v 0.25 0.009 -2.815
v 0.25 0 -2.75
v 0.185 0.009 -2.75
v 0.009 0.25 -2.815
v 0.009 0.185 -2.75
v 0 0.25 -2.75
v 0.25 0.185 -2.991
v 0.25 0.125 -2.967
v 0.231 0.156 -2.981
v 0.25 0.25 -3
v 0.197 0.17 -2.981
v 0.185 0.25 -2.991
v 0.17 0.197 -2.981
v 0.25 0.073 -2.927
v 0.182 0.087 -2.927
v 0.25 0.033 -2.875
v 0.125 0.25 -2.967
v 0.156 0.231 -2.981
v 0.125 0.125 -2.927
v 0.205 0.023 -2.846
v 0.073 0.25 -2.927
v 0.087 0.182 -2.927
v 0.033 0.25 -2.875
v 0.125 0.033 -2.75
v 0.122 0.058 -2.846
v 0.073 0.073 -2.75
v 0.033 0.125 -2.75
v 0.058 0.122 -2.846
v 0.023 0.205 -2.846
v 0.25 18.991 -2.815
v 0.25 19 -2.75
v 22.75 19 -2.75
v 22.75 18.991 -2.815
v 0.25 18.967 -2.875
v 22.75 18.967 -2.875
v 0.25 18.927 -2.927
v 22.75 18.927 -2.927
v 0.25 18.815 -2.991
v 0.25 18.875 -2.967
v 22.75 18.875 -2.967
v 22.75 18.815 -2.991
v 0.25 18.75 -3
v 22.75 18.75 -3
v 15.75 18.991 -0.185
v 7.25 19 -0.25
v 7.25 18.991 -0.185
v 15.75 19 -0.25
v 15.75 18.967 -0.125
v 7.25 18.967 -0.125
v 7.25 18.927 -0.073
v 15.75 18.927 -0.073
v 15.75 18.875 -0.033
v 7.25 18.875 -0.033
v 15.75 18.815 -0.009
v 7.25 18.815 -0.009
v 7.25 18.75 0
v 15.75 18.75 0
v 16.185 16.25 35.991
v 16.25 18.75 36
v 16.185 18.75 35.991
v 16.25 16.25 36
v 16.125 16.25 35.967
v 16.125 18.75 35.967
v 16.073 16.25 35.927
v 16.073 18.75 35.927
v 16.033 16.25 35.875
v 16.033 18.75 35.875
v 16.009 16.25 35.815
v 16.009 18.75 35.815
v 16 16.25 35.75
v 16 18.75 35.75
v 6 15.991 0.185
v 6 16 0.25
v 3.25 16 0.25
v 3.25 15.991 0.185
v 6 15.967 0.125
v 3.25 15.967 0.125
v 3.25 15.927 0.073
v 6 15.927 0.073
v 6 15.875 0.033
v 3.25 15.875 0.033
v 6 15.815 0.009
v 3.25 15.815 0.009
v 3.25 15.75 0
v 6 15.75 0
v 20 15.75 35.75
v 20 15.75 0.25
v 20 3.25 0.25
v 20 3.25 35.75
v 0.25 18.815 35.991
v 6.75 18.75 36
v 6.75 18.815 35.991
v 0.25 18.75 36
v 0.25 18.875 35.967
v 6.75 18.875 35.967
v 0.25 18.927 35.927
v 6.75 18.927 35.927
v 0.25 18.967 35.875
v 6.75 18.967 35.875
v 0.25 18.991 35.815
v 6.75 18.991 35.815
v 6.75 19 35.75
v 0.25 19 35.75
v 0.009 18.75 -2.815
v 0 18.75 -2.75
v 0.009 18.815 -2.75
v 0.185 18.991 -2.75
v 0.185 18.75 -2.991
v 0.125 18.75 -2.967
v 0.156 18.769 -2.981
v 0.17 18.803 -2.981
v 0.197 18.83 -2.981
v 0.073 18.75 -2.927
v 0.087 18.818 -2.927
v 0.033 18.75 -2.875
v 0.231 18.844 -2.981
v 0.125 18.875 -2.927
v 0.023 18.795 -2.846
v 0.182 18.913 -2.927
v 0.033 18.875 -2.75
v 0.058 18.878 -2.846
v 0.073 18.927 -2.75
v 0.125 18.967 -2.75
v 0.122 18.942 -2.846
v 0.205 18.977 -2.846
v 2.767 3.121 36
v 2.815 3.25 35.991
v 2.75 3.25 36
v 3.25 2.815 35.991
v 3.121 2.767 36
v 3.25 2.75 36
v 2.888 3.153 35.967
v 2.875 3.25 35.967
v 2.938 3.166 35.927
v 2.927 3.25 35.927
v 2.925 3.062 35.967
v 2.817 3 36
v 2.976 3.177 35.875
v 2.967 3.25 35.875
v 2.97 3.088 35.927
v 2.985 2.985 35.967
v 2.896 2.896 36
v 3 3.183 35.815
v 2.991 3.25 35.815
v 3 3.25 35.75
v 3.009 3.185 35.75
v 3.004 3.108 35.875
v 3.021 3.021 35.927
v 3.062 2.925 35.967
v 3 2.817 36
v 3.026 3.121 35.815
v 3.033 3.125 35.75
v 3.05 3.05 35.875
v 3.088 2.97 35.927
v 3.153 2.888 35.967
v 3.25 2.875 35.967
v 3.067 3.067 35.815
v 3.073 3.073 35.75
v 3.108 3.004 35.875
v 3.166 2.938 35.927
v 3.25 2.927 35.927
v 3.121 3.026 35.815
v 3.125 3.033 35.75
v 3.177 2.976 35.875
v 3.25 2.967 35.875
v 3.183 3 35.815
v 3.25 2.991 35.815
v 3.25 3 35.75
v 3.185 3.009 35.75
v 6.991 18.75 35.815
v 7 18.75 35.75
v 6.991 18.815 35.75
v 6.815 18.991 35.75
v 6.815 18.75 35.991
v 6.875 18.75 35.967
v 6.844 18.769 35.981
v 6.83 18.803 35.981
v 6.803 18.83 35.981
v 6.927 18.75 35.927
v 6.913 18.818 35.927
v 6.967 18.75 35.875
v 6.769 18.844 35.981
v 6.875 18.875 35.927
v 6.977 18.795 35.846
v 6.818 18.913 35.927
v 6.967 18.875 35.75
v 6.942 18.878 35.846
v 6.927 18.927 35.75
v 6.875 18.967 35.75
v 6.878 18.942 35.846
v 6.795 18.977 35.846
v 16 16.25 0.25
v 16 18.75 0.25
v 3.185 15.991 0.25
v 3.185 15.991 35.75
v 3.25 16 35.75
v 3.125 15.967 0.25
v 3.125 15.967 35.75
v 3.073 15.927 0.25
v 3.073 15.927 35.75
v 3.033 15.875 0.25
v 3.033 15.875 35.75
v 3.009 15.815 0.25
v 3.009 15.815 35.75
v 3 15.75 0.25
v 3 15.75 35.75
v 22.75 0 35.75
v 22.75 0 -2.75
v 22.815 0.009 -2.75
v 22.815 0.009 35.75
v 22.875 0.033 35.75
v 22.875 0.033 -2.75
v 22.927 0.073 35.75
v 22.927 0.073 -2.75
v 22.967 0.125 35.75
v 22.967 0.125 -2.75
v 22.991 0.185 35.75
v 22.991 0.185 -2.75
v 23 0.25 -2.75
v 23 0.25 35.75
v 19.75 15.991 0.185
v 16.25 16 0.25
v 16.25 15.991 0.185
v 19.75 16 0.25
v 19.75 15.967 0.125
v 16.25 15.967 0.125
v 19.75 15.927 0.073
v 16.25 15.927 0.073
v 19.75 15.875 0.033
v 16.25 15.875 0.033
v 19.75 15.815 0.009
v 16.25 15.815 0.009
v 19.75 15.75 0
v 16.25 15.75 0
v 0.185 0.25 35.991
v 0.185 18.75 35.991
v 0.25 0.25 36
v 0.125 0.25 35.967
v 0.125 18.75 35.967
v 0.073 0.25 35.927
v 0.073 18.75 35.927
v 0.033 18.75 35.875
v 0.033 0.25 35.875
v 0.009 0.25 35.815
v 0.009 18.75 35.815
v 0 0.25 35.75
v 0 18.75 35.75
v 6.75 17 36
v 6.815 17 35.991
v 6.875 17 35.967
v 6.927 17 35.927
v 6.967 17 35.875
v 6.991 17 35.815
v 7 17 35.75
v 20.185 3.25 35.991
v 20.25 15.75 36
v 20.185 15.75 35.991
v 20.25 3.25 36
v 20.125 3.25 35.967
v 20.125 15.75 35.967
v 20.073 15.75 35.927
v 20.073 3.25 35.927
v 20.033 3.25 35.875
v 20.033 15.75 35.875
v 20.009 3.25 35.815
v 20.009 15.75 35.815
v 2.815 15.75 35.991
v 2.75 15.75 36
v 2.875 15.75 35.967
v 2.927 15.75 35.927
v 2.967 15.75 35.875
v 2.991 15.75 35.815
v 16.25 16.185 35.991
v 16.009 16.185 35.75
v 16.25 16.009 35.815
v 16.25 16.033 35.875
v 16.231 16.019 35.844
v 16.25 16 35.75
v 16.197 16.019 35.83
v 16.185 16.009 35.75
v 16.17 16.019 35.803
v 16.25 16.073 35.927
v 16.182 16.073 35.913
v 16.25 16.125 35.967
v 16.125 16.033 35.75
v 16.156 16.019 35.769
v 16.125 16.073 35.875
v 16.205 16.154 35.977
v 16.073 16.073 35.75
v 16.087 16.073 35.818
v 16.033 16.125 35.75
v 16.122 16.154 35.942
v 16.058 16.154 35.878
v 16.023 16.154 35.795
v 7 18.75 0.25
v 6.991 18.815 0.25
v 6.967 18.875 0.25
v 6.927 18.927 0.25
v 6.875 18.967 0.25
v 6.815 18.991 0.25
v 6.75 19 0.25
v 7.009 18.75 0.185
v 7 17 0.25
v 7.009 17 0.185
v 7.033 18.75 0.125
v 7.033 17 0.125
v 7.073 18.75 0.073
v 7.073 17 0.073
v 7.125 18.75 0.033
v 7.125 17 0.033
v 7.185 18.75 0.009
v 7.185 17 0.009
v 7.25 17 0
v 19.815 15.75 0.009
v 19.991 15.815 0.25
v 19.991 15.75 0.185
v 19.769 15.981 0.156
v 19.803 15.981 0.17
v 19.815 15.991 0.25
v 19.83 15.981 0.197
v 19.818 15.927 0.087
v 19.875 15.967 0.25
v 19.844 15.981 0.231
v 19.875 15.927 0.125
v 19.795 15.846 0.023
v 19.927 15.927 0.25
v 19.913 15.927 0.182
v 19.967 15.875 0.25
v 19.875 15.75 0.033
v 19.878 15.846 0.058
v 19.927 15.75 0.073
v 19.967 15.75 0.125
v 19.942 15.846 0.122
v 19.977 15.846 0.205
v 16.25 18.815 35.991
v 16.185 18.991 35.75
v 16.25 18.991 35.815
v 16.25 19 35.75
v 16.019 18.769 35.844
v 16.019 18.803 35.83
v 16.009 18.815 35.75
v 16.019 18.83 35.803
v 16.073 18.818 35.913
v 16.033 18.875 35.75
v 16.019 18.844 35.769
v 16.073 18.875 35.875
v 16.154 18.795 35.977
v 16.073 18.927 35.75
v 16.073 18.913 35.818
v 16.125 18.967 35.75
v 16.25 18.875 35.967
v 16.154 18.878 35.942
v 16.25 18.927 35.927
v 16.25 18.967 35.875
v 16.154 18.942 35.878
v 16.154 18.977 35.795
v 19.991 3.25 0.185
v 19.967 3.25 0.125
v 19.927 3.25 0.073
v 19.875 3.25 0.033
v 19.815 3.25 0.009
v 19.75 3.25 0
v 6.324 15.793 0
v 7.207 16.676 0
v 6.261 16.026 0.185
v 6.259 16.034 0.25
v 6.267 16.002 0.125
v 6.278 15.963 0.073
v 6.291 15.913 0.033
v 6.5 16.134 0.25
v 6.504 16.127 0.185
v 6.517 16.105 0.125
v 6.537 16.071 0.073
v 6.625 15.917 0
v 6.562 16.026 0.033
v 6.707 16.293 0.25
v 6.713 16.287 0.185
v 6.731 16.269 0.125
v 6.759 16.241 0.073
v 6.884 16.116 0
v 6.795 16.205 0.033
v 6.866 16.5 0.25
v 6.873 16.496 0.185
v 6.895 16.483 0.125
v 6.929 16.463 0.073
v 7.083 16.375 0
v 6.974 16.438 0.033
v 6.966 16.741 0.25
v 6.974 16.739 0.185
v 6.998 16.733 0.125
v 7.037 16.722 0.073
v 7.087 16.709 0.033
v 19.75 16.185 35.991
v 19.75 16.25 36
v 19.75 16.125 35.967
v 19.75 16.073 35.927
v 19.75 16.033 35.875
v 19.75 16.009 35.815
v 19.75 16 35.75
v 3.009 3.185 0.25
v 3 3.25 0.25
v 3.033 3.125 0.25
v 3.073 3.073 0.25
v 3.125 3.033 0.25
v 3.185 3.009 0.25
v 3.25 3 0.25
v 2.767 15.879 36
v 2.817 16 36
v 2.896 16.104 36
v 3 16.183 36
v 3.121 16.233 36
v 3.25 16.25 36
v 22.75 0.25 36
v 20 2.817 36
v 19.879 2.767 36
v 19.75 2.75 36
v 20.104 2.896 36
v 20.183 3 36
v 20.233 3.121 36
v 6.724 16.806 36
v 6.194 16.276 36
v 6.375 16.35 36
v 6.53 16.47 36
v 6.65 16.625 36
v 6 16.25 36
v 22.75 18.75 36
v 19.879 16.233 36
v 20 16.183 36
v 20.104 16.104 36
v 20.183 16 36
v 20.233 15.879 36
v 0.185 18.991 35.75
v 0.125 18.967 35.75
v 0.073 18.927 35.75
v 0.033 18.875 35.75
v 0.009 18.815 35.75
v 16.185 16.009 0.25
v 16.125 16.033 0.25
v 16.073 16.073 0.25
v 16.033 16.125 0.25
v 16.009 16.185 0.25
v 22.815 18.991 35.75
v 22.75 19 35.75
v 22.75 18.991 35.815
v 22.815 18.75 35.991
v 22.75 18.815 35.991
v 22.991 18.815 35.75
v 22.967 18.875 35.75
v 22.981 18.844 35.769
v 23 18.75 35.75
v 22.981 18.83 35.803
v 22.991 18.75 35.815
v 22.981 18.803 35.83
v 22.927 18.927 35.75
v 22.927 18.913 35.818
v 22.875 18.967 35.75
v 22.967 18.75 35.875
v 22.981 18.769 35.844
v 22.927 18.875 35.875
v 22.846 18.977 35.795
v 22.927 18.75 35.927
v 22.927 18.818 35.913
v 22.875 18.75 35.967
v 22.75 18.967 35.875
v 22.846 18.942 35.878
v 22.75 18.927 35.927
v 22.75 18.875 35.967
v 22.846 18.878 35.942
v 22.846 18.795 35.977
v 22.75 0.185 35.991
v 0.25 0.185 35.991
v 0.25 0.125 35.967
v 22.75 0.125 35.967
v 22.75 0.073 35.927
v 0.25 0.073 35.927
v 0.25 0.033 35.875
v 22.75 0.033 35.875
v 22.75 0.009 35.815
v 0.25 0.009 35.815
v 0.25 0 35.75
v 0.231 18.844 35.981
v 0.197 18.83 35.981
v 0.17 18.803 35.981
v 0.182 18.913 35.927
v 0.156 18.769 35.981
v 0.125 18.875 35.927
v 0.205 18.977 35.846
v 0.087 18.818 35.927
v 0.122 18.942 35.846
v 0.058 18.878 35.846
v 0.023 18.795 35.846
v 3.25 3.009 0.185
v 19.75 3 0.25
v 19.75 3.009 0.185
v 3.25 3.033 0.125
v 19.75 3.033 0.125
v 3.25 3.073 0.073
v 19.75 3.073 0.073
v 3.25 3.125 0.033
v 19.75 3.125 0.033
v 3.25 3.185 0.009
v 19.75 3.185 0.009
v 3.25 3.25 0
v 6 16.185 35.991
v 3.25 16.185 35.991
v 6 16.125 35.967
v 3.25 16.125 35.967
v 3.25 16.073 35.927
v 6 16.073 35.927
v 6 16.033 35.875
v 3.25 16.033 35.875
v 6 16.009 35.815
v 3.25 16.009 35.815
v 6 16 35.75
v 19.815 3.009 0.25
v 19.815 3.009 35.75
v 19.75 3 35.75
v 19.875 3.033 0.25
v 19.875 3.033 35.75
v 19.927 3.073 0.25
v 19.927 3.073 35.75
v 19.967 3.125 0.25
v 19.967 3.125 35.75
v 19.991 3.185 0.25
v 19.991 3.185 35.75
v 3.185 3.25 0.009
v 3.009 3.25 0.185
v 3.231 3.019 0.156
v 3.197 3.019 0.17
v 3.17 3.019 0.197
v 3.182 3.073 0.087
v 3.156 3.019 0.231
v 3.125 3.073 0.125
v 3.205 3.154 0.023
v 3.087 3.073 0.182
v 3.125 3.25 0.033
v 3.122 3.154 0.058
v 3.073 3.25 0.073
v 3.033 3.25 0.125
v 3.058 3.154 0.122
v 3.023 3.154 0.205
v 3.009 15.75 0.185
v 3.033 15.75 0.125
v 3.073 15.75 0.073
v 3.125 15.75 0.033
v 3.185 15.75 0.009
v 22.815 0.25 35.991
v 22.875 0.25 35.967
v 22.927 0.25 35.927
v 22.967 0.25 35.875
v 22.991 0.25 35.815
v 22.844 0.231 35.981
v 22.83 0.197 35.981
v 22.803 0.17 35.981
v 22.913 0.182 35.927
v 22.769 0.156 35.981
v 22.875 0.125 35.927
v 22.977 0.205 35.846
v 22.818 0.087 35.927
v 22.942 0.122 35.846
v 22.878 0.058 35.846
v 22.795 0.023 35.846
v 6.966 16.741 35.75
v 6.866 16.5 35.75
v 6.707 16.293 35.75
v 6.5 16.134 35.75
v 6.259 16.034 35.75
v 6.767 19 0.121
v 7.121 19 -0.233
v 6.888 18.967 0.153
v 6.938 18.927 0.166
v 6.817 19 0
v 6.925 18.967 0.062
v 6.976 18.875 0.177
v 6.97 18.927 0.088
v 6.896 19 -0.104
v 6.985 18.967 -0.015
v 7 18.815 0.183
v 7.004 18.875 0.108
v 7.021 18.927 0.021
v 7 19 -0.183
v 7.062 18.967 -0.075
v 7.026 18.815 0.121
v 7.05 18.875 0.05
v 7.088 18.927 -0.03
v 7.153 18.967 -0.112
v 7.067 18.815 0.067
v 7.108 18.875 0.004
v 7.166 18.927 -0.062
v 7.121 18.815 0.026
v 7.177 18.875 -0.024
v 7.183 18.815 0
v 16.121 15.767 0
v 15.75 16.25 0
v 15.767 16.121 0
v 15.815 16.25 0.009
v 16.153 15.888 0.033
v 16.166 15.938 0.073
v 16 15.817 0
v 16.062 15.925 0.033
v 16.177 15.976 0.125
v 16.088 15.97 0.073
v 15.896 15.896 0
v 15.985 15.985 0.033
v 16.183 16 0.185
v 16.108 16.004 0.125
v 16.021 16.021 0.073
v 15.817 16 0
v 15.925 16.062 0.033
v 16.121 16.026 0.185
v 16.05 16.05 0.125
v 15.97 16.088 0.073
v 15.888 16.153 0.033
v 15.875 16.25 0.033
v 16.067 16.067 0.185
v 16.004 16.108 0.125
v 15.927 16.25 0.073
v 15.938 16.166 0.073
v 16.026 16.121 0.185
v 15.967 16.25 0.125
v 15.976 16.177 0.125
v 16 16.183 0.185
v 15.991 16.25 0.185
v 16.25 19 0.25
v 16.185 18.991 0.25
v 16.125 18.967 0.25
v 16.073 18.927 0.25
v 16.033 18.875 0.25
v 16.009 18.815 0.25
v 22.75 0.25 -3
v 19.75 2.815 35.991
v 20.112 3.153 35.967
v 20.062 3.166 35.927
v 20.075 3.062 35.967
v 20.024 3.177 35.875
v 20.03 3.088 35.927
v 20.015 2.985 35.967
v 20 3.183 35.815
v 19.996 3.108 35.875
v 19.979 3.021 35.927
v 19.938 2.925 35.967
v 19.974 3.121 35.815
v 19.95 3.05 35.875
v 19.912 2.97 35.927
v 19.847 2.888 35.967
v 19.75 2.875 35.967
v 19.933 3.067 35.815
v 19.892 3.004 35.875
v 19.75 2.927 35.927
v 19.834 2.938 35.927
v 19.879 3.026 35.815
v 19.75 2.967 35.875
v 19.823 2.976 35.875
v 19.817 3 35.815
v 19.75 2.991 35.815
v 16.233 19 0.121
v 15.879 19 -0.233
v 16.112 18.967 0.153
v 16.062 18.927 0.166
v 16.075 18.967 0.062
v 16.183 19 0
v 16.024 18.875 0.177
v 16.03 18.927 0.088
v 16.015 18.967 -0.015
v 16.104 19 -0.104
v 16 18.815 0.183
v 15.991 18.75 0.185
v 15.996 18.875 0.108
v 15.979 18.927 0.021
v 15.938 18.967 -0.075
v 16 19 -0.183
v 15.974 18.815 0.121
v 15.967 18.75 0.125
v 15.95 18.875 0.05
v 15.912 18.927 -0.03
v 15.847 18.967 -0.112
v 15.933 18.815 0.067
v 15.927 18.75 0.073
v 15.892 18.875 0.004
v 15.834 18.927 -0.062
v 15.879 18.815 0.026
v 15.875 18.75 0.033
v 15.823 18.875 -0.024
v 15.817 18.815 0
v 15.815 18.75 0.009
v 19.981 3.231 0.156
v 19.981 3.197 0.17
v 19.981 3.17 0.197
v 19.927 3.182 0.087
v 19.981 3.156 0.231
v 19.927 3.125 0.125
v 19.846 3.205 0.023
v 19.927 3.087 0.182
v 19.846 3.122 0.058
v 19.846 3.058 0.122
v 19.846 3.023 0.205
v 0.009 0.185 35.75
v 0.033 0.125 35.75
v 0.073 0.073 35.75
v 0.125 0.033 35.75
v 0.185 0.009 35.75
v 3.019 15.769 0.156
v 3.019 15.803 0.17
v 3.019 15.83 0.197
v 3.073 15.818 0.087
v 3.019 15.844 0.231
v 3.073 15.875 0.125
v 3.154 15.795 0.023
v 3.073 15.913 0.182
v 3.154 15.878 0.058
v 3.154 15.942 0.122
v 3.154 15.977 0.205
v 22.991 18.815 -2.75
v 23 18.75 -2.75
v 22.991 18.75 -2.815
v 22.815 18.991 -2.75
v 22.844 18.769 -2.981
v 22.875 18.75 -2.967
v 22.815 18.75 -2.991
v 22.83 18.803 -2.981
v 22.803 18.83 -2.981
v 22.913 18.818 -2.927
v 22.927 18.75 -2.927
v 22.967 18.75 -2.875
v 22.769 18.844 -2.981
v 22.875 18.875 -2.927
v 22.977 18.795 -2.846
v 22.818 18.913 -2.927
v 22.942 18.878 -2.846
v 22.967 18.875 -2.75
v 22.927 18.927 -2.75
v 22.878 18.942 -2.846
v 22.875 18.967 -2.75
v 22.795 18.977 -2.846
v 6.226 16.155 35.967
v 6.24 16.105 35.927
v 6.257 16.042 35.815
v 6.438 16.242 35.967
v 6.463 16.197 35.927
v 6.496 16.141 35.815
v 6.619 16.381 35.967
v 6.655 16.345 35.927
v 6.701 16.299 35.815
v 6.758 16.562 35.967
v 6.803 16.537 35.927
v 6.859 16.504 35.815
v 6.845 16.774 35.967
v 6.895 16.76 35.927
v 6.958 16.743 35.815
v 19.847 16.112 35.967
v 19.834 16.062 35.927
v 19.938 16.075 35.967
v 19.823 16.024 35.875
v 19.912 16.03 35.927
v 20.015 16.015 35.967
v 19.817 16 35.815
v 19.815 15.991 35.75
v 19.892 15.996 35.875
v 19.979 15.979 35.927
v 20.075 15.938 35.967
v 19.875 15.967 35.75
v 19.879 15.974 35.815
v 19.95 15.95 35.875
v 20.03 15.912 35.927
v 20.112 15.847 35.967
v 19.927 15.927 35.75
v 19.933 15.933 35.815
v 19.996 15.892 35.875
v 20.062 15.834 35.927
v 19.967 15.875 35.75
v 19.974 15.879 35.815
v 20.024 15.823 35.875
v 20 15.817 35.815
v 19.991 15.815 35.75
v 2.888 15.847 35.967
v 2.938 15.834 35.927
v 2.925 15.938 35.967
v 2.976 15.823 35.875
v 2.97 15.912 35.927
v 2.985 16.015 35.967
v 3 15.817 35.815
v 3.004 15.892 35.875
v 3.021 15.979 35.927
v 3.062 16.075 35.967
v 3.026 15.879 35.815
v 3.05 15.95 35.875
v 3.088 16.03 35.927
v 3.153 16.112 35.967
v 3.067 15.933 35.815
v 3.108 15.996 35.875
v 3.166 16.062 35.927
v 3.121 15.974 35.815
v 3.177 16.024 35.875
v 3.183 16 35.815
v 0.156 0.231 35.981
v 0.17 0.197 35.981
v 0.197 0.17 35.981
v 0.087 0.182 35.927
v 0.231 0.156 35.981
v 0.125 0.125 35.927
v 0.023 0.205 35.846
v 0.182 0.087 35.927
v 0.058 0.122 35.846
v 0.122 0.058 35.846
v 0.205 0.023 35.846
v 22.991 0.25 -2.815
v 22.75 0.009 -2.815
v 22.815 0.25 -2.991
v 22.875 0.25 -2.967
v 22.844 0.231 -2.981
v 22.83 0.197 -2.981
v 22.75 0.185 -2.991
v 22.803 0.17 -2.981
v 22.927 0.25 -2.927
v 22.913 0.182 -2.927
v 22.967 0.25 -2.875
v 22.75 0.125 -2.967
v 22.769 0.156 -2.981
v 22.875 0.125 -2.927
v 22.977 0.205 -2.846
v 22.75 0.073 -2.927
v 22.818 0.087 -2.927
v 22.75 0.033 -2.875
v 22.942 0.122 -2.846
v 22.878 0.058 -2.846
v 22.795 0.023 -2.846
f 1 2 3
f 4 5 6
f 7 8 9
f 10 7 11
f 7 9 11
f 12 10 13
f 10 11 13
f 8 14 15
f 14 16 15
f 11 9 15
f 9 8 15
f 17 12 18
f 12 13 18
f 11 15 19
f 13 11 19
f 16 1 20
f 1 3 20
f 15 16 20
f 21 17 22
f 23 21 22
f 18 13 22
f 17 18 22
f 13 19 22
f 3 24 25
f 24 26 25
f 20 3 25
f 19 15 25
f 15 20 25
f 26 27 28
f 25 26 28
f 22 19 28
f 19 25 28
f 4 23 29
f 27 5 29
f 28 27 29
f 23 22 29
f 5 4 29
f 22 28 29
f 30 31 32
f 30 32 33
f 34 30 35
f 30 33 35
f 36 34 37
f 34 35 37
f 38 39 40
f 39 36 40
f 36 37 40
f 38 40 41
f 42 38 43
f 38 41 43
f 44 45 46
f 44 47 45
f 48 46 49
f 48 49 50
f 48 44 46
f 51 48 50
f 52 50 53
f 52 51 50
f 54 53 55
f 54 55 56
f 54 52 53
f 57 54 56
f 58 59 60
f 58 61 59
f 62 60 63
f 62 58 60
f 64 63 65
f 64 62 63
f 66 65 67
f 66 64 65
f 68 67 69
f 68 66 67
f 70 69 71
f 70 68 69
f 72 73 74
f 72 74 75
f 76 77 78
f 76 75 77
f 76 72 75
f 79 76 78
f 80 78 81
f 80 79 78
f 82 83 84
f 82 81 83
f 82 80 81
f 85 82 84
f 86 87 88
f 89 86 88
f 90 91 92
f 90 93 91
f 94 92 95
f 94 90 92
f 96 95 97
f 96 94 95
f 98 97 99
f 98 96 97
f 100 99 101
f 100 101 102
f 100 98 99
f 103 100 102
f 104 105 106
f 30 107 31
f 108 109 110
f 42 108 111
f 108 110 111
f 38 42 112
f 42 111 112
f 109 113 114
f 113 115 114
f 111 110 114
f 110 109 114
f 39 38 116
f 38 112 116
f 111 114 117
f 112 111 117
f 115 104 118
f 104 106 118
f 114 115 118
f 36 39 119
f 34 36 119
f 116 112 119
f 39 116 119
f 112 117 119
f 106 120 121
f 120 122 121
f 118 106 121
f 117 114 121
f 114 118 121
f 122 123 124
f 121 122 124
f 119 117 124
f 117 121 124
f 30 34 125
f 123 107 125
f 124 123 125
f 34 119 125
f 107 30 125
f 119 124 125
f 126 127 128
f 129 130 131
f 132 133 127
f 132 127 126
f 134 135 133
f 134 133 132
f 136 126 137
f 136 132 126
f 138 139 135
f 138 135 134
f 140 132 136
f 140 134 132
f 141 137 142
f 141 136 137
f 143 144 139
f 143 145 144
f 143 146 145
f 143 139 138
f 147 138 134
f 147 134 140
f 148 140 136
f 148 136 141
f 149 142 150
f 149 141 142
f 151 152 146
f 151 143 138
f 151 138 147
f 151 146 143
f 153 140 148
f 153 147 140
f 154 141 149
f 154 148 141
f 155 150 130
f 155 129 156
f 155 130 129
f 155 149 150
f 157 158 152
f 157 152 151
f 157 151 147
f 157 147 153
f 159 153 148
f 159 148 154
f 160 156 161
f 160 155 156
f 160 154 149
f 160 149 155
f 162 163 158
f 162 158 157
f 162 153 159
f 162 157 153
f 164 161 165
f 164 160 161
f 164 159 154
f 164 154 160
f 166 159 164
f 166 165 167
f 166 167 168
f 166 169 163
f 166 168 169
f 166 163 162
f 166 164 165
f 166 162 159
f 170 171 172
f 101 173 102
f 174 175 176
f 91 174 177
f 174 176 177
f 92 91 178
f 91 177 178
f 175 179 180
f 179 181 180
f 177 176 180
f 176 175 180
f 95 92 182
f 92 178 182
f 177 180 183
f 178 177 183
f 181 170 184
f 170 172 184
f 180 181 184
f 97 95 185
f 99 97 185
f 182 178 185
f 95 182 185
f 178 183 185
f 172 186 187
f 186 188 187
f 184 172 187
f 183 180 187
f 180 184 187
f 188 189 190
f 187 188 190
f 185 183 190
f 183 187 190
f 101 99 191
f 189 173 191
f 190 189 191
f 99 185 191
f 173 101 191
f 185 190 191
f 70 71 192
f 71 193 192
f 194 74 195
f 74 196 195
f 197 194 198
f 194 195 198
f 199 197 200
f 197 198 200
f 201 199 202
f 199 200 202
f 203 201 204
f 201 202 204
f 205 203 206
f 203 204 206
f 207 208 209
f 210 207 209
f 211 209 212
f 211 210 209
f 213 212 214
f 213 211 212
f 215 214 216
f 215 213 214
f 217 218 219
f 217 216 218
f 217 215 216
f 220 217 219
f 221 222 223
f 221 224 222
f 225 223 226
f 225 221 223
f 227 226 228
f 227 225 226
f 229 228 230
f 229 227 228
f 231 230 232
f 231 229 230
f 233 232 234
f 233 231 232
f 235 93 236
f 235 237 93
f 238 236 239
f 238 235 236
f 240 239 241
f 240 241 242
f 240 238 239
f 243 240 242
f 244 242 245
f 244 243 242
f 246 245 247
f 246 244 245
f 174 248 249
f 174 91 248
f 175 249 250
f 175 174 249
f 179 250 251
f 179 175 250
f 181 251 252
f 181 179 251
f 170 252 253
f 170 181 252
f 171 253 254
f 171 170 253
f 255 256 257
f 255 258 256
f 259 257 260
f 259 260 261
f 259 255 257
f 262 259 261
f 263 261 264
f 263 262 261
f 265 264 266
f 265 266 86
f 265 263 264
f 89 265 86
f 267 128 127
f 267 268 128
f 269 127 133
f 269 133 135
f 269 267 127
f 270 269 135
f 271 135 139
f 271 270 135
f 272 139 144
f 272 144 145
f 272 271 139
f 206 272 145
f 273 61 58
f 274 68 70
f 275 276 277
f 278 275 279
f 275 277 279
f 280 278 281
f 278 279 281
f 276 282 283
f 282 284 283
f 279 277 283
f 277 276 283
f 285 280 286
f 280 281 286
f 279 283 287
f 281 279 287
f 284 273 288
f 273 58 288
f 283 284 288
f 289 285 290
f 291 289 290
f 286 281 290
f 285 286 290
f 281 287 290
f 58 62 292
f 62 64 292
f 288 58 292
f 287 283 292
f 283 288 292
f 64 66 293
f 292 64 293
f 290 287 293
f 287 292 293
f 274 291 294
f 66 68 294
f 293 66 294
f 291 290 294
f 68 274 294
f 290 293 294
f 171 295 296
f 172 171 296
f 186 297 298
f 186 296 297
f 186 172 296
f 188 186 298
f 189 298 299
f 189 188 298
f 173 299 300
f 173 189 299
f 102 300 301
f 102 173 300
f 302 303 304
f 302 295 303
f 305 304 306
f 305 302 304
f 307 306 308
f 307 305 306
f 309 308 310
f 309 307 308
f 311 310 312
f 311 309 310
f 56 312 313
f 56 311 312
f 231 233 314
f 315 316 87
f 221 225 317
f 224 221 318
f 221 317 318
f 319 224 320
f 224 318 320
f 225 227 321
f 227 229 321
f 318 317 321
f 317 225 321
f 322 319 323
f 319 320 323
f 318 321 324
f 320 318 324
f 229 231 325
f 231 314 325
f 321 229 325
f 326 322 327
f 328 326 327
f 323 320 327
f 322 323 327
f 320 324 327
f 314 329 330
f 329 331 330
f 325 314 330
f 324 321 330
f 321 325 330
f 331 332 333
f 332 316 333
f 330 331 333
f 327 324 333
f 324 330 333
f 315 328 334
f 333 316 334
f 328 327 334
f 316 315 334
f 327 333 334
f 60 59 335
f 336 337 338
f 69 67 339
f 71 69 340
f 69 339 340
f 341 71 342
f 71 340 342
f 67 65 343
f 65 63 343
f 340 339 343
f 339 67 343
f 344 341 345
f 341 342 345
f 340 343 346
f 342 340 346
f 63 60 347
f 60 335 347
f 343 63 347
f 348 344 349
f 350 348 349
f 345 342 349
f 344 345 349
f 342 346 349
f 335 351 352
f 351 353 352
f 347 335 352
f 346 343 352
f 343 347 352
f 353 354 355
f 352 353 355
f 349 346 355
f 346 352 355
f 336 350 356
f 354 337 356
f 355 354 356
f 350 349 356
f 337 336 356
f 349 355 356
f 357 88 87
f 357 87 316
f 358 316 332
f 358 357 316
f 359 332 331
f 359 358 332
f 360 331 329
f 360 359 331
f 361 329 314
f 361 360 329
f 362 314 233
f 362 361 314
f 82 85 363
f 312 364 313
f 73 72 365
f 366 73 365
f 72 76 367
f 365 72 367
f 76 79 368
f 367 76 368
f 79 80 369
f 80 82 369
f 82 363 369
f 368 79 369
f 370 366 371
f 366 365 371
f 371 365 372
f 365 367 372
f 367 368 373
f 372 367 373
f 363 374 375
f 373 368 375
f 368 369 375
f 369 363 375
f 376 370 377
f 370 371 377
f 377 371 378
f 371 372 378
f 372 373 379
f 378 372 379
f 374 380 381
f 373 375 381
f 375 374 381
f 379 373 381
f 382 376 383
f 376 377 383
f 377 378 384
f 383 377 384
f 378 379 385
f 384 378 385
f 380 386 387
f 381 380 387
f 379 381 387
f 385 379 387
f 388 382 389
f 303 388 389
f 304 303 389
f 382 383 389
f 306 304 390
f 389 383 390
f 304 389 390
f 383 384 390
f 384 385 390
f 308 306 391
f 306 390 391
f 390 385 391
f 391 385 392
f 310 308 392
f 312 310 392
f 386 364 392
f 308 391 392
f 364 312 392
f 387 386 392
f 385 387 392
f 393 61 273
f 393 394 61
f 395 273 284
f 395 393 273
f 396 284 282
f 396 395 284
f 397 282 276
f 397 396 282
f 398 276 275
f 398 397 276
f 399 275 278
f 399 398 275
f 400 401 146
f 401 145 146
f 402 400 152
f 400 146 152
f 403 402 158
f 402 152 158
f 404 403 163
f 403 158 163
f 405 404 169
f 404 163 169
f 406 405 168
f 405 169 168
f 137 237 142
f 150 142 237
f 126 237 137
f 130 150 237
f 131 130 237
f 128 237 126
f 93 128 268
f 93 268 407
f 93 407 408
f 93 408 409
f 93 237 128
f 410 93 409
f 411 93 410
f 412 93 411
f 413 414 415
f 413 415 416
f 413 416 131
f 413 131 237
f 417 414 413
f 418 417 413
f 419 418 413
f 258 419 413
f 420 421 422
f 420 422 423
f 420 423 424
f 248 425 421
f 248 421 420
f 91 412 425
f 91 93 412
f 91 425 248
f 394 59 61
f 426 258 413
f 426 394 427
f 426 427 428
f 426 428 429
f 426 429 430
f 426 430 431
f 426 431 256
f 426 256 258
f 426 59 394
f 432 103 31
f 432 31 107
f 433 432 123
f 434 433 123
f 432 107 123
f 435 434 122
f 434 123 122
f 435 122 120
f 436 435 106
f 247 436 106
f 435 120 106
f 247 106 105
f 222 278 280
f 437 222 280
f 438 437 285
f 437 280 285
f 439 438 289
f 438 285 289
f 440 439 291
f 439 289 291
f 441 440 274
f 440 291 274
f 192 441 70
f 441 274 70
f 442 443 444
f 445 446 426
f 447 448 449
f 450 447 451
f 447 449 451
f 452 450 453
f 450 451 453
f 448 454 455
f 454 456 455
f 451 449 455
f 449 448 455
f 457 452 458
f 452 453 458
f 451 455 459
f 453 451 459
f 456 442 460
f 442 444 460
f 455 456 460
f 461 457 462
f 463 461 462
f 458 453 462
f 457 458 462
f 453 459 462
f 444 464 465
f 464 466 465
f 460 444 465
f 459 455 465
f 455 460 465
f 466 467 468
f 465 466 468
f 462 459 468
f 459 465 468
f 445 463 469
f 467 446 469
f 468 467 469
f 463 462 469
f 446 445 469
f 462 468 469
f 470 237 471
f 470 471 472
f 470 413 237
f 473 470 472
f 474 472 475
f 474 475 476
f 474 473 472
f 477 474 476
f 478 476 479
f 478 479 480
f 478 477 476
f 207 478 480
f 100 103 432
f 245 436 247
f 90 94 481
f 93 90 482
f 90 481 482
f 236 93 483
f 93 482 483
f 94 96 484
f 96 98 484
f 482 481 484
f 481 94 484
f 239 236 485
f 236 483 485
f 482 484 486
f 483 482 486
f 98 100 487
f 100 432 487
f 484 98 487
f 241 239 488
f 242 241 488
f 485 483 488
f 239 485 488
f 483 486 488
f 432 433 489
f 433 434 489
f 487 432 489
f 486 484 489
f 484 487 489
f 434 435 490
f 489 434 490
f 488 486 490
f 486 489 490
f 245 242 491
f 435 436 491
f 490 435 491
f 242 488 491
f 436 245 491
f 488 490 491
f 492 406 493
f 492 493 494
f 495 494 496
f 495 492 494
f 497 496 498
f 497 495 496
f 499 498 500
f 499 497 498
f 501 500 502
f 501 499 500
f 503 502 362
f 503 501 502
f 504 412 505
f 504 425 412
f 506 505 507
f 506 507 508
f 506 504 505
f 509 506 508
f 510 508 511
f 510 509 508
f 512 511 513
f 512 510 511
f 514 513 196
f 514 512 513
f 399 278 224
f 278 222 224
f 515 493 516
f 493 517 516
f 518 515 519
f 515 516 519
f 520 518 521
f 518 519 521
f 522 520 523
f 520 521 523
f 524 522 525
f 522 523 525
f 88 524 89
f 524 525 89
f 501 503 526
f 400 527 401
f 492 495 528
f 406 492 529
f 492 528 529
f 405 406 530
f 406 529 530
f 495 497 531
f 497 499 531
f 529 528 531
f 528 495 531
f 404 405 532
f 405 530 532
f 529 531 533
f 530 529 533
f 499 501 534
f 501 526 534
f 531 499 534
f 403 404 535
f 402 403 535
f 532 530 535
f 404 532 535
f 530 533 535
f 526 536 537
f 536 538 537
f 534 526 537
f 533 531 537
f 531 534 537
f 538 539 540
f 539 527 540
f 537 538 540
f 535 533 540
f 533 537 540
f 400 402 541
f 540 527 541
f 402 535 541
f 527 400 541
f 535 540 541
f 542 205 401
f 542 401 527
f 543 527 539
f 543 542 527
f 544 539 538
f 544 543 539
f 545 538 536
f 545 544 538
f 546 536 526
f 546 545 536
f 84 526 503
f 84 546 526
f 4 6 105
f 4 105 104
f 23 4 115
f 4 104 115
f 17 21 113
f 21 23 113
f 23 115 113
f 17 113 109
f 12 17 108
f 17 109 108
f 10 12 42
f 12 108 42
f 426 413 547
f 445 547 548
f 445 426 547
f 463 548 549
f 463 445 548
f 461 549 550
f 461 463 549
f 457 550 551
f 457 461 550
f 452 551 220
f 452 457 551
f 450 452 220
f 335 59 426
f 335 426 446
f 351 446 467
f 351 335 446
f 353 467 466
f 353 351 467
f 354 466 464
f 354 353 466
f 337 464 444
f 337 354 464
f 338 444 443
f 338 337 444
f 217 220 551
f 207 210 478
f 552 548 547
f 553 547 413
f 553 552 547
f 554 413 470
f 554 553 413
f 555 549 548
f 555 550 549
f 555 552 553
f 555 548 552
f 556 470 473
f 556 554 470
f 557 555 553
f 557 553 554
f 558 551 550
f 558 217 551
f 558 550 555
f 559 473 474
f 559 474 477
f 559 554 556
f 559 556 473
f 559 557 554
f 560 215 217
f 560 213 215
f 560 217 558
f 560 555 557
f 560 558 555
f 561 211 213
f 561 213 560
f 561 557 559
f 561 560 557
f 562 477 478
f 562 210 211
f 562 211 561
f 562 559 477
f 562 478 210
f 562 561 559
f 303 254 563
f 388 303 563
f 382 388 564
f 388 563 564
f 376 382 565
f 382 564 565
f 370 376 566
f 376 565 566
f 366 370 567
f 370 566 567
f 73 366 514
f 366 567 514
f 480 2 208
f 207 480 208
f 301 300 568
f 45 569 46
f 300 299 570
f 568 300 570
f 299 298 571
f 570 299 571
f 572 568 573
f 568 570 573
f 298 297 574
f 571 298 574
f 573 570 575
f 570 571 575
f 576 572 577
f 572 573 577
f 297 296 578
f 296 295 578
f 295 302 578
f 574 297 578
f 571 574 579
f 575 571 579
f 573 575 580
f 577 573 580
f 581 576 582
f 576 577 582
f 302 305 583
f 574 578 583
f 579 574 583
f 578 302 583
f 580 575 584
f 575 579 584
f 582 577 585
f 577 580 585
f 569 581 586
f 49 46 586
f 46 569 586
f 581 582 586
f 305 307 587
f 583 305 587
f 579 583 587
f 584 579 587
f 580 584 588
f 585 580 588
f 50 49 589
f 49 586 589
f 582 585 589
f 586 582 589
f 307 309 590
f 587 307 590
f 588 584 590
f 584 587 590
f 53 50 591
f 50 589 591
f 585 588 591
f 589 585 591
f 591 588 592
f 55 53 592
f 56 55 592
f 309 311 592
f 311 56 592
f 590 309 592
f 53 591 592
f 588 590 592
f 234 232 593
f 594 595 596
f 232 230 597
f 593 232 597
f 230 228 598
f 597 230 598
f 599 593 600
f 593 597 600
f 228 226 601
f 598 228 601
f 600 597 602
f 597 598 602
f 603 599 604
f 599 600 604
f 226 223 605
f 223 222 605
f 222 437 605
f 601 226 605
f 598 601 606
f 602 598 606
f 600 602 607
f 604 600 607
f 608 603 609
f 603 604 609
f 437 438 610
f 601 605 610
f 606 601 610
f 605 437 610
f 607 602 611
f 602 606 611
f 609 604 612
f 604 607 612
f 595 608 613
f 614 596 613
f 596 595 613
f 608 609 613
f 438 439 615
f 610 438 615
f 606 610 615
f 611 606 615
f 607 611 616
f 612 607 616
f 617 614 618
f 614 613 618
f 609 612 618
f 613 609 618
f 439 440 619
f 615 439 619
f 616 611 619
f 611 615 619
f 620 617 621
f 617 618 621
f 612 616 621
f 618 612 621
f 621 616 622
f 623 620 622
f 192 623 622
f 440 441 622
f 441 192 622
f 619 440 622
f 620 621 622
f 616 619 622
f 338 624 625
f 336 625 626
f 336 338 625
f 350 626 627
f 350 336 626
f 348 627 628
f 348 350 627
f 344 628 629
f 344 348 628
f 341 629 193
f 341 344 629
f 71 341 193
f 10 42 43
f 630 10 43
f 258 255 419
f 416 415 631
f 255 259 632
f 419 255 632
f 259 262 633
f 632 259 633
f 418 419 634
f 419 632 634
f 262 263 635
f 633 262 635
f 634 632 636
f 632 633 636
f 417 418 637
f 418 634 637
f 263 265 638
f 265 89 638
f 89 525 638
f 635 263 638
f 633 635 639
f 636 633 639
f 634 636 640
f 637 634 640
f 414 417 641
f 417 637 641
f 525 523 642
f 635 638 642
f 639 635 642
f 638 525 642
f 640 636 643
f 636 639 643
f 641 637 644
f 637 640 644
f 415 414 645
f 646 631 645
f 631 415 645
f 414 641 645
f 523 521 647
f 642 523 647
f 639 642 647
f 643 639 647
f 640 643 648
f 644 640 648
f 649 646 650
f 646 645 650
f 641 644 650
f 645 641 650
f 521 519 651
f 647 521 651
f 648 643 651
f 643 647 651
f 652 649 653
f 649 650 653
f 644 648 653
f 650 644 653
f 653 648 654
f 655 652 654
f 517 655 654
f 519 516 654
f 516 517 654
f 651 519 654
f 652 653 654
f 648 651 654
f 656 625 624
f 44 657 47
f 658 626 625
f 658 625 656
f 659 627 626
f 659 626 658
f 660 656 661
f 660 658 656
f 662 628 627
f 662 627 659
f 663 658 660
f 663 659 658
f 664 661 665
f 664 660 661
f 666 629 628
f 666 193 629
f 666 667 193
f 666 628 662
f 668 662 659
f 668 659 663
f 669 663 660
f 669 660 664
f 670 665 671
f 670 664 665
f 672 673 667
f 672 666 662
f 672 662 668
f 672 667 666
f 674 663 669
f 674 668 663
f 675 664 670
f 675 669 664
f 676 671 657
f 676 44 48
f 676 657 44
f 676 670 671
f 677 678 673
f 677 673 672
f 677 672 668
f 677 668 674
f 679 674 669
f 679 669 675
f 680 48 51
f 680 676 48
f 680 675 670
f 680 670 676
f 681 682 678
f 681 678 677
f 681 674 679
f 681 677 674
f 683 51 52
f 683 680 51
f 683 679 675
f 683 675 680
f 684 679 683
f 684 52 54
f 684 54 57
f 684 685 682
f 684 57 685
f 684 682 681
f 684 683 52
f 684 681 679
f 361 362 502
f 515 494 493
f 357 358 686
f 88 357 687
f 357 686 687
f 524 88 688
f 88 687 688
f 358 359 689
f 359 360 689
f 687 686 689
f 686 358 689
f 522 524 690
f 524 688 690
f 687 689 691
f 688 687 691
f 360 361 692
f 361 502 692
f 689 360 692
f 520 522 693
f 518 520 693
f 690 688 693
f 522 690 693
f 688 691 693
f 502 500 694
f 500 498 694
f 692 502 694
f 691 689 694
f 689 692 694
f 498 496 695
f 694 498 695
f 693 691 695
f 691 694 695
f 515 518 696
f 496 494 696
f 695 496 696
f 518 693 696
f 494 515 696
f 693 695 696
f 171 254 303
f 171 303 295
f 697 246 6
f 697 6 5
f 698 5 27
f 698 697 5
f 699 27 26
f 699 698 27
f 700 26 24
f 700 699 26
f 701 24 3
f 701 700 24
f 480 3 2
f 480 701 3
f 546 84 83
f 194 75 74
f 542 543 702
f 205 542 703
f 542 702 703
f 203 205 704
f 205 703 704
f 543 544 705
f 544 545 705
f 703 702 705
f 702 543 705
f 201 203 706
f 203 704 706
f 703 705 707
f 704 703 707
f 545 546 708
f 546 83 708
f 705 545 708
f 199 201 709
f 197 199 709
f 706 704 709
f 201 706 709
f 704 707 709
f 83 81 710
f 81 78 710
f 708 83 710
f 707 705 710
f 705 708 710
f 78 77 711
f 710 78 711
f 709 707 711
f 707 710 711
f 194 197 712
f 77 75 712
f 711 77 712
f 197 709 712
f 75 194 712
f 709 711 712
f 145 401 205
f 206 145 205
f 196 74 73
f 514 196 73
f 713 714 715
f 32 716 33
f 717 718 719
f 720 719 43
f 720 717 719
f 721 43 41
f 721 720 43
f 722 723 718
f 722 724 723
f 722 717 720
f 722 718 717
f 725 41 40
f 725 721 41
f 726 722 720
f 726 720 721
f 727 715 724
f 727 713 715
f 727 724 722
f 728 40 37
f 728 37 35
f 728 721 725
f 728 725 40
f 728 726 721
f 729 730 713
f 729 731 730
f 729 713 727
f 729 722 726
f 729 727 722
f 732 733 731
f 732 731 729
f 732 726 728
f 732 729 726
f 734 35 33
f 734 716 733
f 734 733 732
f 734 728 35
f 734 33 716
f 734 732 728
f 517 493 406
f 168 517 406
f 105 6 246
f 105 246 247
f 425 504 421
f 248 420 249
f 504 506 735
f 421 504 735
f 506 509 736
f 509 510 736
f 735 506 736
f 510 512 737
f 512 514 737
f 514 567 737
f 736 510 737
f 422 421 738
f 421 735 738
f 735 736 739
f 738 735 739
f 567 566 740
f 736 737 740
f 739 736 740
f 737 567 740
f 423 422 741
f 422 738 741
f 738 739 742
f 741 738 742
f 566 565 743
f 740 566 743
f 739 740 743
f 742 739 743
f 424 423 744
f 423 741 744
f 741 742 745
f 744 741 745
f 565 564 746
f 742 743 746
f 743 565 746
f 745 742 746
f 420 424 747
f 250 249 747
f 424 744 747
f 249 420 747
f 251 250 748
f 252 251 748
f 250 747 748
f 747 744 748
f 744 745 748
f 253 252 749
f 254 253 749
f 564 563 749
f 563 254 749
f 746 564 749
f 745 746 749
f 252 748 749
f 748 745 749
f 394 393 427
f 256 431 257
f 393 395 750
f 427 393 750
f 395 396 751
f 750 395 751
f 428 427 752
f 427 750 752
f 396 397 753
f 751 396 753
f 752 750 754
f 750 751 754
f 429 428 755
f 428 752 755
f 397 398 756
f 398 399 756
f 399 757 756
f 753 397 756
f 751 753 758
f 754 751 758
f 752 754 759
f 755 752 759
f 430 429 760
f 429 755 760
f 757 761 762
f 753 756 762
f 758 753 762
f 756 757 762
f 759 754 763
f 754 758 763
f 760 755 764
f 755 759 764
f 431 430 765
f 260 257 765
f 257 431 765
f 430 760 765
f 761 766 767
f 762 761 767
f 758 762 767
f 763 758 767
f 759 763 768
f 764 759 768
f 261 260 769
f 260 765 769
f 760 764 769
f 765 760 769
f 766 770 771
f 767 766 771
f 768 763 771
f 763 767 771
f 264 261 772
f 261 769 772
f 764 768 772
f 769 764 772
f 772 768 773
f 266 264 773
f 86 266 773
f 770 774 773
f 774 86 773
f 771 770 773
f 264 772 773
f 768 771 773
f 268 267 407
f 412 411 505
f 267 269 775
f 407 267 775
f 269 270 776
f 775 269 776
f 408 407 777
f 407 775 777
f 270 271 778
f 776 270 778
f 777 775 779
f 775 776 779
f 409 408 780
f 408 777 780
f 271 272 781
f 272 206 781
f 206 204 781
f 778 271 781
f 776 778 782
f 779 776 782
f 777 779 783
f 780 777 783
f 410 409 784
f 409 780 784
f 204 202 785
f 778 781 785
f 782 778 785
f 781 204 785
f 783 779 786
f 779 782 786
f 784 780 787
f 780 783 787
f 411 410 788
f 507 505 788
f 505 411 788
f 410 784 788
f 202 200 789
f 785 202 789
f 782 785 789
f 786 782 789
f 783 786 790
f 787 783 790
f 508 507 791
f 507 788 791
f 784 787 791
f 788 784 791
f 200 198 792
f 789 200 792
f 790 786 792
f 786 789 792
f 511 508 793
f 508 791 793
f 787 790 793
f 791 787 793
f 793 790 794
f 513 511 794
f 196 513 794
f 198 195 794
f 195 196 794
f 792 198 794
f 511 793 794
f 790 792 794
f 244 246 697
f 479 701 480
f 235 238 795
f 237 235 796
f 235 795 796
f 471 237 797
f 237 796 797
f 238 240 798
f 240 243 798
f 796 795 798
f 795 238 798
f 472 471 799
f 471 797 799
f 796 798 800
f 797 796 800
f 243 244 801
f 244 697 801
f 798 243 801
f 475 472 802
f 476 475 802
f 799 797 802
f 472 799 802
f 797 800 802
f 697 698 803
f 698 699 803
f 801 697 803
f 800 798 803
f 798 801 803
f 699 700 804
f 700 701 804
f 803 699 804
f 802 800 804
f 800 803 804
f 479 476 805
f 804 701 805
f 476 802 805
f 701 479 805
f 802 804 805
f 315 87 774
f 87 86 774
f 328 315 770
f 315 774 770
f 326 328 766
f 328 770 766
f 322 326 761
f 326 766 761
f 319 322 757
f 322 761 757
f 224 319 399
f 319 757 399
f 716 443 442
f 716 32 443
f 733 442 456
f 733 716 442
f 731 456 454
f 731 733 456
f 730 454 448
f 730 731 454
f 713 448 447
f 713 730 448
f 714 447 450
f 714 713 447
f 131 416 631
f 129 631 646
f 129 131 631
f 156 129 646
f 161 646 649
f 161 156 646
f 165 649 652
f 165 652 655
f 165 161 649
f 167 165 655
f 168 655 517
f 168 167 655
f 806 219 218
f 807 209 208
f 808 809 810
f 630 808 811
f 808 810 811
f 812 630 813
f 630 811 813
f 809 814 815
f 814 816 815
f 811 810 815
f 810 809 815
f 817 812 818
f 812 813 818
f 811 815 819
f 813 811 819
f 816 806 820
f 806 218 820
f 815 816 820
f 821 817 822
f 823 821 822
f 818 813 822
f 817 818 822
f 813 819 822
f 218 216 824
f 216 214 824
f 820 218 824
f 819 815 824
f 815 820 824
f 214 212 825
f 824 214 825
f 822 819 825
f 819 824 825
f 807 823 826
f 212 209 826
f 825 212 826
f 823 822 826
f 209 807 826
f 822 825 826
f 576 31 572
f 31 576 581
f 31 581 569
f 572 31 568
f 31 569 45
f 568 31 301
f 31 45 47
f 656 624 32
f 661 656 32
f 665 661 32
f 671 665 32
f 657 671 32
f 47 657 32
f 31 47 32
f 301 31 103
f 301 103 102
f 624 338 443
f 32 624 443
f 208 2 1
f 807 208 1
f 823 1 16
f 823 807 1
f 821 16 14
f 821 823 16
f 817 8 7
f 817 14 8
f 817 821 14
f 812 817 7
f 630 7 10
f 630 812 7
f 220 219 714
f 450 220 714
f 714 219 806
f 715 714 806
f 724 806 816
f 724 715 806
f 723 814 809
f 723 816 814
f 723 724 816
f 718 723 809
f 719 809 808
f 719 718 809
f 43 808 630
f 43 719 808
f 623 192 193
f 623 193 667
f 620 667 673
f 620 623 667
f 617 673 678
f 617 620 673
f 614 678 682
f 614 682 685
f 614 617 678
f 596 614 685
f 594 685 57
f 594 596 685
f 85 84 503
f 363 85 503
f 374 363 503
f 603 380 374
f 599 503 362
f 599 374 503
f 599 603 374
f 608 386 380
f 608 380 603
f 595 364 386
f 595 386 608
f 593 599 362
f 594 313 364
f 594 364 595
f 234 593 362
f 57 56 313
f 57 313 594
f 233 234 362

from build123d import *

# Parameters (mm, degrees)
BOSS_EXTRU_1_DEPTH = 36
ESQUISSE2_W        = 23
ESQUISSE2_H        = 19
BOSS_EXTRU_2_DEPTH = 3
CONG_1_R           = 1
CONG_2_R           = 0.25


with BuildPart() as part:
    # Esquisse1 → Boss.-Extru.1 (new body)
    with BuildSketch(Plane.XY):
        Polygon((0, 0), (23, 0), (23, 3), (23, 19), (16, 19), (16, 16), (20, 16), (20, 3), (3, 3), (3, 16), (7, 16), (7, 19), (0, 19), (0, 3), align=None)
    extrude(amount=BOSS_EXTRU_1_DEPTH)

    # Esquisse2 → Boss.-Extru.2 (add)
    with BuildSketch(Plane.XY):
        with Locations((11.5, 9.5)):
            Rectangle(ESQUISSE2_W, ESQUISSE2_H)
    extrude(amount=-BOSS_EXTRU_2_DEPTH)

    # Congé1
    cong_1_edges = [part.edges().sort_by_distance(p)[0] for p in [
        (7, 16, 18),
    ]]
    fillet(cong_1_edges, radius=CONG_1_R)

    # Congé2
    cong_2_edges = [part.edges().sort_by_distance(p)[0] for p in [
        (19.5, 19, 36),
        (16, 17.5, 36),
        (4.5, 16, 0),
        (3, 9.5, 0),
        (11.5, 3, 0),
        (20, 9.5, 0),
        (18, 16, 36),
        (18, 16, 0),
        (16, 17.5, 0),
        (20, 9.5, 36),
        (11.5, 3, 36),
        (23, 0, 16.5),
        (0, 0, 16.5),
        (0, 19, 16.5),
        (7, 19, 18),
        (3, 16, 18),
        (3, 3, 18),
        (20, 3, 18),
        (20, 16, 18),
        (16, 16, 18),
        (16, 19, 18),
        (23, 19, 16.5),
        (3, 9.5, 36),
        (4.5, 16, 36),
        (3.5, 19, 36),
        (0, 9.5, 36),
        (23, 9.5, 36),
        (23, 9.5, -3),
        (11.5, 0, -3),
        (0, 9.5, -3),
        (11.5, 19, -3),
        (11.5, 19, 0),
        (11.5, 0, 36),
        (7, 18, 0),
        (7, 18, 36),
        (6.707106781, 16.292893219, 36),
        (6.707106781, 16.292893219, 0),
    ]]
    fillet(cong_2_edges, radius=CONG_2_R)


solid = part.part
